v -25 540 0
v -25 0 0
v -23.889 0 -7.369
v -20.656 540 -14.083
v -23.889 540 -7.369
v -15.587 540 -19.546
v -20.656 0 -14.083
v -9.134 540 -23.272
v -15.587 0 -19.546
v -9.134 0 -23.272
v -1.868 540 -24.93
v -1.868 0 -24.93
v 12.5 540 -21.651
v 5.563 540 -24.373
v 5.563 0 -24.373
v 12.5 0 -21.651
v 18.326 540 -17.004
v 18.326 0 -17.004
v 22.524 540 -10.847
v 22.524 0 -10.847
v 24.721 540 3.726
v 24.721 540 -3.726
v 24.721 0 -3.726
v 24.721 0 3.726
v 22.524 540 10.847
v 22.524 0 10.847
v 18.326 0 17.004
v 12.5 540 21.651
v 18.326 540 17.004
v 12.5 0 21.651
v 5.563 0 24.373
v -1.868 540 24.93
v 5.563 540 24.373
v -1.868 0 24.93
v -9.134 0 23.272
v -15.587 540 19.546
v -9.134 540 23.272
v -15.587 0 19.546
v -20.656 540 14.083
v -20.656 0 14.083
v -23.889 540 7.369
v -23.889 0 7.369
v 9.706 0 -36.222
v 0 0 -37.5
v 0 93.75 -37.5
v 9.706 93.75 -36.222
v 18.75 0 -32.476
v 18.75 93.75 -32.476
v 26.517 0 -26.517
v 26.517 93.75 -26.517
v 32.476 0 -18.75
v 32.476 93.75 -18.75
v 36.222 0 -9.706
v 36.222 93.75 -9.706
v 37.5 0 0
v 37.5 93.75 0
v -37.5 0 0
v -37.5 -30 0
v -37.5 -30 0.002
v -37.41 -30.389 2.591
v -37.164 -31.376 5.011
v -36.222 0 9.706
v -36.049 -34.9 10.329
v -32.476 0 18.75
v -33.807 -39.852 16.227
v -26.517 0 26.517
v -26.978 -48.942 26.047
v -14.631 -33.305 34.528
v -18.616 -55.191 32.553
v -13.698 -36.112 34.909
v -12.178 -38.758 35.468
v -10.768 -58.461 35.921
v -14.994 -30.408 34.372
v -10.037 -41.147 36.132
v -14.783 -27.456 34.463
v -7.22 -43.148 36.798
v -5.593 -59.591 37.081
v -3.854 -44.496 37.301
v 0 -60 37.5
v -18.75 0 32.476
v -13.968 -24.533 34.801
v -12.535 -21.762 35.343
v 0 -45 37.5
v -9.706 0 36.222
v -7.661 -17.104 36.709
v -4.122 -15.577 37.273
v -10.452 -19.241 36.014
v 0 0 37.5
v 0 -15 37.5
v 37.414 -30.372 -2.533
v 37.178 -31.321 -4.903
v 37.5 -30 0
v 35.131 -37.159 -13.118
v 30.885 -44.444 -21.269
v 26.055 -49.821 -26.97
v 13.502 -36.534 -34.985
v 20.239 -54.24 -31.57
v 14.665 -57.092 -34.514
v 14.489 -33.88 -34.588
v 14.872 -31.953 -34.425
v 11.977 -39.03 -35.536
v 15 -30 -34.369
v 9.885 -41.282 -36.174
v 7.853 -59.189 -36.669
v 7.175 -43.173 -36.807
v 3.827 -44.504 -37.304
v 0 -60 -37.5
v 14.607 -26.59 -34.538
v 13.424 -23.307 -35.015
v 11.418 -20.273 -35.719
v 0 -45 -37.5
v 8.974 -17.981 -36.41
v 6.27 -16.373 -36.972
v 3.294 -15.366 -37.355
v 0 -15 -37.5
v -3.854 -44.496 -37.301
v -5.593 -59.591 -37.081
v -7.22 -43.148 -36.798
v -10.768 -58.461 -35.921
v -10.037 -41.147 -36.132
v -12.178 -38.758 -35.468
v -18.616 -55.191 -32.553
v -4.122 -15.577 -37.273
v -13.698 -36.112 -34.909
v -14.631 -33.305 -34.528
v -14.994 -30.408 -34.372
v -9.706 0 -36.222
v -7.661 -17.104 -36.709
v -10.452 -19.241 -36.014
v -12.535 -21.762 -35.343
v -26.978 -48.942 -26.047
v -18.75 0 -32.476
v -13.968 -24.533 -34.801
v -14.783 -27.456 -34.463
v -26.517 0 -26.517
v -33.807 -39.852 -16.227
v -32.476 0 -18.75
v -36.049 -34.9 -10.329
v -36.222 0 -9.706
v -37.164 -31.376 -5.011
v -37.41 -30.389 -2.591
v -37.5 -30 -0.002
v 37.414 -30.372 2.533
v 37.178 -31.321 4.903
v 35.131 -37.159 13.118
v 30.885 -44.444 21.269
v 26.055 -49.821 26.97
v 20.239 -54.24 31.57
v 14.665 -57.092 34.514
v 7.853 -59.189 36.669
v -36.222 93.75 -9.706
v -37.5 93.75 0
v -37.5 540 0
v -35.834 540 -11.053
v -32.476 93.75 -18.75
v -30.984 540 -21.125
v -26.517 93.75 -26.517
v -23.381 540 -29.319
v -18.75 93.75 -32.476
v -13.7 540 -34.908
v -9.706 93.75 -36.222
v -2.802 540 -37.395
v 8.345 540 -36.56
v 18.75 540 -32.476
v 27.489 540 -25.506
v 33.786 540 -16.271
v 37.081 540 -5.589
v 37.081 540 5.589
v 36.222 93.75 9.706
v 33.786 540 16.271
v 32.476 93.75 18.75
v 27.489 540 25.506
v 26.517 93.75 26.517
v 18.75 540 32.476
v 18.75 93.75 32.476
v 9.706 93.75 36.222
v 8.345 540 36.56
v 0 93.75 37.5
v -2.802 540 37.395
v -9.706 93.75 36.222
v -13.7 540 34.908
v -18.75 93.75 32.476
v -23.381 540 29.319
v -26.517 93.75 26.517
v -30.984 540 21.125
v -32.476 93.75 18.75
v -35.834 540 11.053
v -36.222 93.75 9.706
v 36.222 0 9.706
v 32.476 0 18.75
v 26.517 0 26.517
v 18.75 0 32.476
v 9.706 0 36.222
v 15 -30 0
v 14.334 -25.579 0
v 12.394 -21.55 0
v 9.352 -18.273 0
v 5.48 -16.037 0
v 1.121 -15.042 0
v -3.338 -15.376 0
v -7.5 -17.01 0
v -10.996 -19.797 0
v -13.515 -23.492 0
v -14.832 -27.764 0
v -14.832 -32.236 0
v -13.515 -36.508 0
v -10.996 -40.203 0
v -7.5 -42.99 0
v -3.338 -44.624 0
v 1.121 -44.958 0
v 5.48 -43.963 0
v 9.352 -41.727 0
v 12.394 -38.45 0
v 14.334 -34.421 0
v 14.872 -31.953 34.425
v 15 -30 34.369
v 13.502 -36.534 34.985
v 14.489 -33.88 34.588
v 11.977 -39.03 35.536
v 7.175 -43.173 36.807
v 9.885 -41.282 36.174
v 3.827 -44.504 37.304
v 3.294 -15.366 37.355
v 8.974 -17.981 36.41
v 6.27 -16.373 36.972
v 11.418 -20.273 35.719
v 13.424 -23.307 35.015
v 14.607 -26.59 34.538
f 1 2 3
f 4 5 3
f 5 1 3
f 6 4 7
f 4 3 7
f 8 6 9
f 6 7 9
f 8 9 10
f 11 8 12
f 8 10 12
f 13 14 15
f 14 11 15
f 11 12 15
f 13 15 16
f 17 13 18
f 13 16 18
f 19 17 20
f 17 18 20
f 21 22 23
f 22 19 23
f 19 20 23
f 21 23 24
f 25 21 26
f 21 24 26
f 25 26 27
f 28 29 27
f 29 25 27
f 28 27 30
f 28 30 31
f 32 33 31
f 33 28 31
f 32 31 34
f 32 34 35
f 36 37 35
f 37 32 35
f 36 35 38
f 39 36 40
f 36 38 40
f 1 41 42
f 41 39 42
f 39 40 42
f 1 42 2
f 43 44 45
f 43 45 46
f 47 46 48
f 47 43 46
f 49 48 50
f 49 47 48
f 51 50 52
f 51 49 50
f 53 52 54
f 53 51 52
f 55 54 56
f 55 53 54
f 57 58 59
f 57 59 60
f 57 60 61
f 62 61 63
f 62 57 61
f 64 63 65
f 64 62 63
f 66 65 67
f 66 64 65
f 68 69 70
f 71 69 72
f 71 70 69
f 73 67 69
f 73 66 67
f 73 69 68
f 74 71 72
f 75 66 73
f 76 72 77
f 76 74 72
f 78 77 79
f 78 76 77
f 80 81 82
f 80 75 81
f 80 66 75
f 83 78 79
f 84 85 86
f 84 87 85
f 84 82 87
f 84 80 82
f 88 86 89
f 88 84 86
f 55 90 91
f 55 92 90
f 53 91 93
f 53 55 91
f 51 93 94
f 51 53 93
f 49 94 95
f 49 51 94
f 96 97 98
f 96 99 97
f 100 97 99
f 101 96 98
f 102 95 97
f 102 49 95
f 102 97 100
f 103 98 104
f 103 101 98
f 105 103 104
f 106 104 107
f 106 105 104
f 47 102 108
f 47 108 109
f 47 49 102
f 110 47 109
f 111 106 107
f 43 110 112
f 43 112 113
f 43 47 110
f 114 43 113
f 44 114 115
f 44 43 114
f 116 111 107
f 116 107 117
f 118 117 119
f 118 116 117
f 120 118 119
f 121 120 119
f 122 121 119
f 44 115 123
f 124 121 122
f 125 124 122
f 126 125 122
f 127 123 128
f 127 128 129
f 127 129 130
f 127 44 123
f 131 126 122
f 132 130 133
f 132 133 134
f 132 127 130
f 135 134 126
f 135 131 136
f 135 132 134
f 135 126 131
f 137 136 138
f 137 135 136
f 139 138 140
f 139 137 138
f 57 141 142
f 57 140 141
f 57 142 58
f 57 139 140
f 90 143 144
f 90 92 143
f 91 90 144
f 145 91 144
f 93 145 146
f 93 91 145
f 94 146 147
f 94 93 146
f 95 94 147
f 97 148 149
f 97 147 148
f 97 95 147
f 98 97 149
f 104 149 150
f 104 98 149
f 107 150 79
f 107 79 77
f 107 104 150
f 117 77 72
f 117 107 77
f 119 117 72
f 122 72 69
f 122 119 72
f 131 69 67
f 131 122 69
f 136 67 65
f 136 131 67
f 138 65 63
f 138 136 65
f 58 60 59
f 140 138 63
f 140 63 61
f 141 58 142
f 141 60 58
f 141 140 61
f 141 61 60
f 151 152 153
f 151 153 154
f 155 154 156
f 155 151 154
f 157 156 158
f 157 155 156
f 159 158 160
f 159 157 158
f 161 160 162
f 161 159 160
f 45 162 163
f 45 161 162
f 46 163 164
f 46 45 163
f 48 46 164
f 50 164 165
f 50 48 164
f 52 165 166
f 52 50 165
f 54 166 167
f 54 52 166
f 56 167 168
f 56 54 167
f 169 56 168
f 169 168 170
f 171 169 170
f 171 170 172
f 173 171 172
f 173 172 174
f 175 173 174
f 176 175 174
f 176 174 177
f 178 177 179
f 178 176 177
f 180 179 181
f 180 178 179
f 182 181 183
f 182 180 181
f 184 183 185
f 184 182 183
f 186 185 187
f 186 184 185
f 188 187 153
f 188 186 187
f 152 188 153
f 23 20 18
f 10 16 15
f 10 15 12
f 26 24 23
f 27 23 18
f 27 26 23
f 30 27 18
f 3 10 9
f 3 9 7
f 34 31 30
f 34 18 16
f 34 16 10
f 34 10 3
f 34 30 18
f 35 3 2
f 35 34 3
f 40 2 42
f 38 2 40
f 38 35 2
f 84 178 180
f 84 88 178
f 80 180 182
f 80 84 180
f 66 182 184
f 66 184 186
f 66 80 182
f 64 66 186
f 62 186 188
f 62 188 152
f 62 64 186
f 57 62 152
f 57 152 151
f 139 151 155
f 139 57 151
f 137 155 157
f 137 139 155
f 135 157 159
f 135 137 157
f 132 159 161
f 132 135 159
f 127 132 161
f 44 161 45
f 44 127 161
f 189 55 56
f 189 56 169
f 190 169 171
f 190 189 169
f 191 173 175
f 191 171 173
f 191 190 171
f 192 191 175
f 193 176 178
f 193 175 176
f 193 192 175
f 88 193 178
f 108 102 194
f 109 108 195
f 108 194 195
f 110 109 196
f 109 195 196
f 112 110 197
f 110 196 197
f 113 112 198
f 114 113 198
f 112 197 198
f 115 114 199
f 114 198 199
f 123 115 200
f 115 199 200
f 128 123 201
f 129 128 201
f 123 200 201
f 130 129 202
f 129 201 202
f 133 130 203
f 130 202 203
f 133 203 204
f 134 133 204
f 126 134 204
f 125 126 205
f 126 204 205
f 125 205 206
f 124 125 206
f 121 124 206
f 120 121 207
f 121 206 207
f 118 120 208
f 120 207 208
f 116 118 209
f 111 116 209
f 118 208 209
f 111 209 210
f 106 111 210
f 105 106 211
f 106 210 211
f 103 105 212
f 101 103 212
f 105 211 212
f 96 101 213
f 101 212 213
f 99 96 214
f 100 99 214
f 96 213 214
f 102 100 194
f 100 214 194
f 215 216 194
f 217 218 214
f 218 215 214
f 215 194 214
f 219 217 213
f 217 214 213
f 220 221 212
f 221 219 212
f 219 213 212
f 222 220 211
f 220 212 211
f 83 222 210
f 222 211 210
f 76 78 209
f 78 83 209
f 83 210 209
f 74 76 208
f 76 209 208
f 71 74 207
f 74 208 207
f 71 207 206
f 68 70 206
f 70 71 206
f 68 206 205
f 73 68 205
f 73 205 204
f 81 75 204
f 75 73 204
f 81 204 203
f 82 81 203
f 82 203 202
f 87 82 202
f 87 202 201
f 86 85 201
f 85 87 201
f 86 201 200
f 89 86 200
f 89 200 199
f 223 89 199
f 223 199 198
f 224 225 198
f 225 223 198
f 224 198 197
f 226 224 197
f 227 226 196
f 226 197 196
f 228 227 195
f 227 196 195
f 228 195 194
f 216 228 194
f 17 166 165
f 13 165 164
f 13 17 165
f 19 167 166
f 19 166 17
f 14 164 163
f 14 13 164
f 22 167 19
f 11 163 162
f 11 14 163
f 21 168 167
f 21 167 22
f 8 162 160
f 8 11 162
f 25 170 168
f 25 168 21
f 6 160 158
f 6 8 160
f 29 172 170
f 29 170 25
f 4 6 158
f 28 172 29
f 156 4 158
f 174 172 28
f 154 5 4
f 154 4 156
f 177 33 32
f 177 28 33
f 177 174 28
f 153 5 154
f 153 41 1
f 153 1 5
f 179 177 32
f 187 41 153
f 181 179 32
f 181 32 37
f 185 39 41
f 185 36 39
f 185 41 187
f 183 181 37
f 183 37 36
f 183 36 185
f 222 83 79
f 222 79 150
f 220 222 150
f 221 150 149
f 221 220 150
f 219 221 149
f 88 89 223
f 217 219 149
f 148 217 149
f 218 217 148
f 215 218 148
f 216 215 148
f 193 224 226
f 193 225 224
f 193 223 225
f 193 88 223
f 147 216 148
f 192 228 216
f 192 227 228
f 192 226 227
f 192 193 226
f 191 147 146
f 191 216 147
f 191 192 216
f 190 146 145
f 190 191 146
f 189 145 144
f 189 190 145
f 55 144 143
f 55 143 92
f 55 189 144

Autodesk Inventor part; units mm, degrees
sketch "Sketch1" plane through (0, 0, 0) normal (0, 1, 0) x (-1, 0, 0)
  circle A0 centre (0, 0) radius 37.5
  circle A1 centre (0, 0) radius 25
  dimension "d0" = 75
  dimension "d1" = 50
extrude "Extrusion1" add sketch "Sketch1" along normal blind 540
sketch "Sketch2" plane through (0, 0, 0) normal (0, 1, 0) x (-1, 0, 0)
  line L0 (-37.5, -37.5) -> (37.5, -37.5)
  line L1 (37.5, -37.5) -> (37.5, 37.5)
  line L2 (37.5, 37.5) -> (-37.5, 37.5)
  line L3 (-37.5, 37.5) -> (-37.5, -37.5)
  point P0 (0, 0)
extrude "Extrusion2" add sketch "Sketch2" against normal blind 60
sketch "Sketch3" plane through (0, 0, 0) normal (0, 0, 1) x (1, 0, 0)
  circle A0 centre (0, -30) radius 15
  line L0 (-52.5, 0) -> (52.5, 0) projected
  line L1 (-37.5, 0) -> (-37.5, -60) projected
  line L2 (37.5, 0) -> (37.5, -60) projected
  arc A1 (-37.5, -30) -> (37.5, -30) centre (0, -21.5625) ccw
  line L3 (-37.5, -30) -> (-52.5, -30)
  line L4 (-52.5, -30) -> (-52.5, -80.2965)
  line L5 (-52.5, -80.2965) -> (57.4115, -80.2965)
  line L6 (57.4115, -80.2965) -> (57.4115, -30)
  line L7 (57.4115, -30) -> (37.5, -30)
  point P0 (0, 0)
  dimension "d6" = 30
  dimension "d7" = 30
extrude "Extrusion3" cut sketch "Sketch3" along normal mid plane 150 contours A0 | A1 L7 L6 L5 L4 L3
fillet "Fillet1" radius 37.5 4 edges at (37.5, -15, 37.5) (37.5, -15, -37.5) (-37.5, -15, 37.5) (-37.5, -15, -37.5)
properties part number "Cylinder_Bom"
